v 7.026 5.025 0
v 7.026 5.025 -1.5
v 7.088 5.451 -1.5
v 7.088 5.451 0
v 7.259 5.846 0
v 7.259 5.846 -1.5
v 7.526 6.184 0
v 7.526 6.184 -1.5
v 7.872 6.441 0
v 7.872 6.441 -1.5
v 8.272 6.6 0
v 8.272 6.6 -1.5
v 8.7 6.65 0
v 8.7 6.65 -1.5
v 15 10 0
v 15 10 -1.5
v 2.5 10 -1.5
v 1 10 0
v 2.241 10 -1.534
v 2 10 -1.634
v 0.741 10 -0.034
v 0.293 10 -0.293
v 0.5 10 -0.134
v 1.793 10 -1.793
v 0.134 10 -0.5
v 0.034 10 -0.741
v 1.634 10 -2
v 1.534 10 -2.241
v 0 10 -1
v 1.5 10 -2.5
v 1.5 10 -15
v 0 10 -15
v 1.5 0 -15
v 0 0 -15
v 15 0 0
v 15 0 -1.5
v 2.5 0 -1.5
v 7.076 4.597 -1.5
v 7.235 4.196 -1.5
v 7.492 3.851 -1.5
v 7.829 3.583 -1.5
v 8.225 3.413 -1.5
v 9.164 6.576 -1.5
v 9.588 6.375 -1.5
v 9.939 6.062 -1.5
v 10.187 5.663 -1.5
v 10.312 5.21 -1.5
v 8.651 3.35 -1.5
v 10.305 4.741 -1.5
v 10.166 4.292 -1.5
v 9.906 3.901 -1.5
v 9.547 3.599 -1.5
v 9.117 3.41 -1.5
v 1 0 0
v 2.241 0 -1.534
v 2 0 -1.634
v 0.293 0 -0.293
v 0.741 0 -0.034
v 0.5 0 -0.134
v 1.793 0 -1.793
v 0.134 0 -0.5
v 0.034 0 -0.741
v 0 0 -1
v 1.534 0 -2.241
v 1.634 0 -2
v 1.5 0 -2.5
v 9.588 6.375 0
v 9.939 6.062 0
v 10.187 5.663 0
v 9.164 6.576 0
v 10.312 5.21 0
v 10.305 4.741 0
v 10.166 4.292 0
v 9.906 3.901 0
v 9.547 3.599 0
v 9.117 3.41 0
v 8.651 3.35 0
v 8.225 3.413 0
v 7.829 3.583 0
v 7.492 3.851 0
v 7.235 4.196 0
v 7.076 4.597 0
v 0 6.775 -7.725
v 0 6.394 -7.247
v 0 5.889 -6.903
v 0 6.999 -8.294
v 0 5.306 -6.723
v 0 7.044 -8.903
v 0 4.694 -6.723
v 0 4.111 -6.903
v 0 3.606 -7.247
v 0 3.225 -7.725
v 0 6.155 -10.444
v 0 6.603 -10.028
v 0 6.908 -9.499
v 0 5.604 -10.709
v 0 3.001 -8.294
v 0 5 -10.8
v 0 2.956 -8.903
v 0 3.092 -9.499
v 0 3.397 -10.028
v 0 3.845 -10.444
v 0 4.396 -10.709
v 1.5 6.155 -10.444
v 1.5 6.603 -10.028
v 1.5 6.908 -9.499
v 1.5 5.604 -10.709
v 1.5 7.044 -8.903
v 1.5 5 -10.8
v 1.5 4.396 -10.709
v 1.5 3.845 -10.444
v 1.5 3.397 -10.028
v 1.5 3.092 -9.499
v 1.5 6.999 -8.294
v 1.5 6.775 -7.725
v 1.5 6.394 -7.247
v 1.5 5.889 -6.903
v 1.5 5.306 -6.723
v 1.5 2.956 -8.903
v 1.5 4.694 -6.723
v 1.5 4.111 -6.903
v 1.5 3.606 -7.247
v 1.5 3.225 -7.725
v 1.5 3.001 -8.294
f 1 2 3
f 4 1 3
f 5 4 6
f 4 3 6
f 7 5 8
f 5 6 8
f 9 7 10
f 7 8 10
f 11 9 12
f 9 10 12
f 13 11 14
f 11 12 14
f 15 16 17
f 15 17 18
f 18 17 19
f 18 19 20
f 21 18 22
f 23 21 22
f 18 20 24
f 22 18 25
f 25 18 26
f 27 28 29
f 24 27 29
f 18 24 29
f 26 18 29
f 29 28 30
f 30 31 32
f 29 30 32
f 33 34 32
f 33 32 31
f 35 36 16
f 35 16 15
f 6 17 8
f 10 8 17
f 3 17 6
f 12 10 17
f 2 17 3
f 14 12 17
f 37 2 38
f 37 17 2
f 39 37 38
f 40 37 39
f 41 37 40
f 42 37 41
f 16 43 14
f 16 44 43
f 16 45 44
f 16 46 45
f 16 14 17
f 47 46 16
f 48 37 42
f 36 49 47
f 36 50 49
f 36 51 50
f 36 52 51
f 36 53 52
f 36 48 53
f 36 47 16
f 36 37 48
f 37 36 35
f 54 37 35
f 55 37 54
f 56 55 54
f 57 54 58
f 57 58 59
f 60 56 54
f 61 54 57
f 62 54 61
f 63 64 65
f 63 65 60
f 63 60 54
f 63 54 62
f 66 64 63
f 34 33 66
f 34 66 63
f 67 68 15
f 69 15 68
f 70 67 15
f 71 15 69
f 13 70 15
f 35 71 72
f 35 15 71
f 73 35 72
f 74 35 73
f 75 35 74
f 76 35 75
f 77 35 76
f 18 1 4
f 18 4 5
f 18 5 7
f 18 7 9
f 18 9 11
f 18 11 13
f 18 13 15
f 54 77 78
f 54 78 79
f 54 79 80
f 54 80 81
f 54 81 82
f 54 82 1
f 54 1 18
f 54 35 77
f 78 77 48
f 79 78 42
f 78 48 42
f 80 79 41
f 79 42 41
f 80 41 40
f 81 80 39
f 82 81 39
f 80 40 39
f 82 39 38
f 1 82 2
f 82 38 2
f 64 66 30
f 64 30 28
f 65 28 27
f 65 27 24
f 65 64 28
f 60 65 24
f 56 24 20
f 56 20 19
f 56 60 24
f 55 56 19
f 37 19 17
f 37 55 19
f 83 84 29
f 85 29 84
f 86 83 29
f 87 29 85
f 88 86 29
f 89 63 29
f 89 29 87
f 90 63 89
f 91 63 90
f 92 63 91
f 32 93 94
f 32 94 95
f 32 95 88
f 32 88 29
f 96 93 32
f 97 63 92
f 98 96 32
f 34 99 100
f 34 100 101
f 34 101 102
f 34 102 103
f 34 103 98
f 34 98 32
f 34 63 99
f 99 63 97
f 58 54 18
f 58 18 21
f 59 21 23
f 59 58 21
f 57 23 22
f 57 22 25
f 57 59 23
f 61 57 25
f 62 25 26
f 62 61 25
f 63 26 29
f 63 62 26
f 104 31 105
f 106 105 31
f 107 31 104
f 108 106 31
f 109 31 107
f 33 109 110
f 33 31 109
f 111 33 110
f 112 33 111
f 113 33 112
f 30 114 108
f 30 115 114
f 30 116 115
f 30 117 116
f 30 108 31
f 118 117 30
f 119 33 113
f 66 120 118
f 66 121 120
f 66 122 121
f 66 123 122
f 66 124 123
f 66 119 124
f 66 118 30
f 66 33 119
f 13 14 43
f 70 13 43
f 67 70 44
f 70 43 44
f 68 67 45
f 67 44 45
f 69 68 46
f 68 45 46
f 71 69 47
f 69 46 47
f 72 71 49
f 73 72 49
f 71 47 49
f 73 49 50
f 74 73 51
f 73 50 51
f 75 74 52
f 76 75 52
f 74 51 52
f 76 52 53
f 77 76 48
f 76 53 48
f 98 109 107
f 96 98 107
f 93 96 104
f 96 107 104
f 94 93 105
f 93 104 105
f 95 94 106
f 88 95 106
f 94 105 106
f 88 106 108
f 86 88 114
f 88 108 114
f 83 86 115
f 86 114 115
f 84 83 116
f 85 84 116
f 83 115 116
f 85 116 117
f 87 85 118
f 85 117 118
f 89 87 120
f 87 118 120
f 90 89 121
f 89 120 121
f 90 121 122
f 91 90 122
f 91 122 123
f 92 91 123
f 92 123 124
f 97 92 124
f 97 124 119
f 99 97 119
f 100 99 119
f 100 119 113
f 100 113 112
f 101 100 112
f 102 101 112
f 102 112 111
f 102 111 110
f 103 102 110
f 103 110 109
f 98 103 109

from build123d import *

# Parameters (mm, degrees)
EXTRUDE_1_DEPTH     = 10
CUT_EXTRUDE_3_DEPTH = 8
SKETCH_12_R         = 2.05
CUT_EXTRUDE_5_DEPTH = 95


with BuildPart() as part:
    # Эскиз1 → Бобышка-Вытянуть1 (new body)
    with BuildSketch(Plane(origin=(0, 0, 0), x_dir=(1, 0, 0), z_dir=(0, 1, 0))):
        with BuildLine():
            Line((0, 1), (0, 15))
            Line((0, 15), (1.5, 15))
            Line((1.5, 15), (1.5, 2.5))
            ThreePointArc((1.5, 2.5), (1.792893219, 1.792893219), (2.5, 1.5))
            Line((2.5, 1.5), (15, 1.5))
            Line((15, 1.5), (15, 0))
            Line((15, 0), (1, 0))
            ThreePointArc((1, 0), (0.292893219, 0.292893219), (0, 1))
        make_face()
    extrude(amount=EXTRUDE_1_DEPTH)

    # Эскиз6 → Вырез-Вытянуть3 (cut)
    with BuildSketch(Plane(origin=(-307.940790238, -349.204468703, -1.5), x_dir=(-0.9998892265297747, 0.014884040771535371, 0), z_dir=(0, 0, -1))):
        with BuildLine():
            ThreePointArc((-309.659295343, 358.877763083), (-310.142569154, 360.044489272), (-311.309295343, 360.527763083))
            Line((-311.309295343, 360.527763083), (-311.309295343, 357.227763083))
            ThreePointArc((-311.309295343, 357.227763083), (-310.142569154, 357.711036894), (-309.659295343, 358.877763083))
        make_face()
        with BuildLine():
            Line((-311.309295343, 357.227763083), (-311.309295343, 360.527763083))
            ThreePointArc((-311.309295343, 360.527763083), (-312.959295343, 358.877763083), (-311.309295343, 357.227763083))
        make_face()
    extrude(amount=-CUT_EXTRUDE_3_DEPTH, mode=Mode.SUBTRACT)

    # Эскиз12 → Вырез-Вытянуть5 (cut)
    with BuildSketch(Plane(origin=(1.5, 0, 0), x_dir=(0, 0, -1), z_dir=(1, 0, 0))):
        with Locations((8.75, 5)):
            Circle(SKETCH_12_R)
    extrude(amount=-CUT_EXTRUDE_5_DEPTH, mode=Mode.SUBTRACT)


solid = part.part
